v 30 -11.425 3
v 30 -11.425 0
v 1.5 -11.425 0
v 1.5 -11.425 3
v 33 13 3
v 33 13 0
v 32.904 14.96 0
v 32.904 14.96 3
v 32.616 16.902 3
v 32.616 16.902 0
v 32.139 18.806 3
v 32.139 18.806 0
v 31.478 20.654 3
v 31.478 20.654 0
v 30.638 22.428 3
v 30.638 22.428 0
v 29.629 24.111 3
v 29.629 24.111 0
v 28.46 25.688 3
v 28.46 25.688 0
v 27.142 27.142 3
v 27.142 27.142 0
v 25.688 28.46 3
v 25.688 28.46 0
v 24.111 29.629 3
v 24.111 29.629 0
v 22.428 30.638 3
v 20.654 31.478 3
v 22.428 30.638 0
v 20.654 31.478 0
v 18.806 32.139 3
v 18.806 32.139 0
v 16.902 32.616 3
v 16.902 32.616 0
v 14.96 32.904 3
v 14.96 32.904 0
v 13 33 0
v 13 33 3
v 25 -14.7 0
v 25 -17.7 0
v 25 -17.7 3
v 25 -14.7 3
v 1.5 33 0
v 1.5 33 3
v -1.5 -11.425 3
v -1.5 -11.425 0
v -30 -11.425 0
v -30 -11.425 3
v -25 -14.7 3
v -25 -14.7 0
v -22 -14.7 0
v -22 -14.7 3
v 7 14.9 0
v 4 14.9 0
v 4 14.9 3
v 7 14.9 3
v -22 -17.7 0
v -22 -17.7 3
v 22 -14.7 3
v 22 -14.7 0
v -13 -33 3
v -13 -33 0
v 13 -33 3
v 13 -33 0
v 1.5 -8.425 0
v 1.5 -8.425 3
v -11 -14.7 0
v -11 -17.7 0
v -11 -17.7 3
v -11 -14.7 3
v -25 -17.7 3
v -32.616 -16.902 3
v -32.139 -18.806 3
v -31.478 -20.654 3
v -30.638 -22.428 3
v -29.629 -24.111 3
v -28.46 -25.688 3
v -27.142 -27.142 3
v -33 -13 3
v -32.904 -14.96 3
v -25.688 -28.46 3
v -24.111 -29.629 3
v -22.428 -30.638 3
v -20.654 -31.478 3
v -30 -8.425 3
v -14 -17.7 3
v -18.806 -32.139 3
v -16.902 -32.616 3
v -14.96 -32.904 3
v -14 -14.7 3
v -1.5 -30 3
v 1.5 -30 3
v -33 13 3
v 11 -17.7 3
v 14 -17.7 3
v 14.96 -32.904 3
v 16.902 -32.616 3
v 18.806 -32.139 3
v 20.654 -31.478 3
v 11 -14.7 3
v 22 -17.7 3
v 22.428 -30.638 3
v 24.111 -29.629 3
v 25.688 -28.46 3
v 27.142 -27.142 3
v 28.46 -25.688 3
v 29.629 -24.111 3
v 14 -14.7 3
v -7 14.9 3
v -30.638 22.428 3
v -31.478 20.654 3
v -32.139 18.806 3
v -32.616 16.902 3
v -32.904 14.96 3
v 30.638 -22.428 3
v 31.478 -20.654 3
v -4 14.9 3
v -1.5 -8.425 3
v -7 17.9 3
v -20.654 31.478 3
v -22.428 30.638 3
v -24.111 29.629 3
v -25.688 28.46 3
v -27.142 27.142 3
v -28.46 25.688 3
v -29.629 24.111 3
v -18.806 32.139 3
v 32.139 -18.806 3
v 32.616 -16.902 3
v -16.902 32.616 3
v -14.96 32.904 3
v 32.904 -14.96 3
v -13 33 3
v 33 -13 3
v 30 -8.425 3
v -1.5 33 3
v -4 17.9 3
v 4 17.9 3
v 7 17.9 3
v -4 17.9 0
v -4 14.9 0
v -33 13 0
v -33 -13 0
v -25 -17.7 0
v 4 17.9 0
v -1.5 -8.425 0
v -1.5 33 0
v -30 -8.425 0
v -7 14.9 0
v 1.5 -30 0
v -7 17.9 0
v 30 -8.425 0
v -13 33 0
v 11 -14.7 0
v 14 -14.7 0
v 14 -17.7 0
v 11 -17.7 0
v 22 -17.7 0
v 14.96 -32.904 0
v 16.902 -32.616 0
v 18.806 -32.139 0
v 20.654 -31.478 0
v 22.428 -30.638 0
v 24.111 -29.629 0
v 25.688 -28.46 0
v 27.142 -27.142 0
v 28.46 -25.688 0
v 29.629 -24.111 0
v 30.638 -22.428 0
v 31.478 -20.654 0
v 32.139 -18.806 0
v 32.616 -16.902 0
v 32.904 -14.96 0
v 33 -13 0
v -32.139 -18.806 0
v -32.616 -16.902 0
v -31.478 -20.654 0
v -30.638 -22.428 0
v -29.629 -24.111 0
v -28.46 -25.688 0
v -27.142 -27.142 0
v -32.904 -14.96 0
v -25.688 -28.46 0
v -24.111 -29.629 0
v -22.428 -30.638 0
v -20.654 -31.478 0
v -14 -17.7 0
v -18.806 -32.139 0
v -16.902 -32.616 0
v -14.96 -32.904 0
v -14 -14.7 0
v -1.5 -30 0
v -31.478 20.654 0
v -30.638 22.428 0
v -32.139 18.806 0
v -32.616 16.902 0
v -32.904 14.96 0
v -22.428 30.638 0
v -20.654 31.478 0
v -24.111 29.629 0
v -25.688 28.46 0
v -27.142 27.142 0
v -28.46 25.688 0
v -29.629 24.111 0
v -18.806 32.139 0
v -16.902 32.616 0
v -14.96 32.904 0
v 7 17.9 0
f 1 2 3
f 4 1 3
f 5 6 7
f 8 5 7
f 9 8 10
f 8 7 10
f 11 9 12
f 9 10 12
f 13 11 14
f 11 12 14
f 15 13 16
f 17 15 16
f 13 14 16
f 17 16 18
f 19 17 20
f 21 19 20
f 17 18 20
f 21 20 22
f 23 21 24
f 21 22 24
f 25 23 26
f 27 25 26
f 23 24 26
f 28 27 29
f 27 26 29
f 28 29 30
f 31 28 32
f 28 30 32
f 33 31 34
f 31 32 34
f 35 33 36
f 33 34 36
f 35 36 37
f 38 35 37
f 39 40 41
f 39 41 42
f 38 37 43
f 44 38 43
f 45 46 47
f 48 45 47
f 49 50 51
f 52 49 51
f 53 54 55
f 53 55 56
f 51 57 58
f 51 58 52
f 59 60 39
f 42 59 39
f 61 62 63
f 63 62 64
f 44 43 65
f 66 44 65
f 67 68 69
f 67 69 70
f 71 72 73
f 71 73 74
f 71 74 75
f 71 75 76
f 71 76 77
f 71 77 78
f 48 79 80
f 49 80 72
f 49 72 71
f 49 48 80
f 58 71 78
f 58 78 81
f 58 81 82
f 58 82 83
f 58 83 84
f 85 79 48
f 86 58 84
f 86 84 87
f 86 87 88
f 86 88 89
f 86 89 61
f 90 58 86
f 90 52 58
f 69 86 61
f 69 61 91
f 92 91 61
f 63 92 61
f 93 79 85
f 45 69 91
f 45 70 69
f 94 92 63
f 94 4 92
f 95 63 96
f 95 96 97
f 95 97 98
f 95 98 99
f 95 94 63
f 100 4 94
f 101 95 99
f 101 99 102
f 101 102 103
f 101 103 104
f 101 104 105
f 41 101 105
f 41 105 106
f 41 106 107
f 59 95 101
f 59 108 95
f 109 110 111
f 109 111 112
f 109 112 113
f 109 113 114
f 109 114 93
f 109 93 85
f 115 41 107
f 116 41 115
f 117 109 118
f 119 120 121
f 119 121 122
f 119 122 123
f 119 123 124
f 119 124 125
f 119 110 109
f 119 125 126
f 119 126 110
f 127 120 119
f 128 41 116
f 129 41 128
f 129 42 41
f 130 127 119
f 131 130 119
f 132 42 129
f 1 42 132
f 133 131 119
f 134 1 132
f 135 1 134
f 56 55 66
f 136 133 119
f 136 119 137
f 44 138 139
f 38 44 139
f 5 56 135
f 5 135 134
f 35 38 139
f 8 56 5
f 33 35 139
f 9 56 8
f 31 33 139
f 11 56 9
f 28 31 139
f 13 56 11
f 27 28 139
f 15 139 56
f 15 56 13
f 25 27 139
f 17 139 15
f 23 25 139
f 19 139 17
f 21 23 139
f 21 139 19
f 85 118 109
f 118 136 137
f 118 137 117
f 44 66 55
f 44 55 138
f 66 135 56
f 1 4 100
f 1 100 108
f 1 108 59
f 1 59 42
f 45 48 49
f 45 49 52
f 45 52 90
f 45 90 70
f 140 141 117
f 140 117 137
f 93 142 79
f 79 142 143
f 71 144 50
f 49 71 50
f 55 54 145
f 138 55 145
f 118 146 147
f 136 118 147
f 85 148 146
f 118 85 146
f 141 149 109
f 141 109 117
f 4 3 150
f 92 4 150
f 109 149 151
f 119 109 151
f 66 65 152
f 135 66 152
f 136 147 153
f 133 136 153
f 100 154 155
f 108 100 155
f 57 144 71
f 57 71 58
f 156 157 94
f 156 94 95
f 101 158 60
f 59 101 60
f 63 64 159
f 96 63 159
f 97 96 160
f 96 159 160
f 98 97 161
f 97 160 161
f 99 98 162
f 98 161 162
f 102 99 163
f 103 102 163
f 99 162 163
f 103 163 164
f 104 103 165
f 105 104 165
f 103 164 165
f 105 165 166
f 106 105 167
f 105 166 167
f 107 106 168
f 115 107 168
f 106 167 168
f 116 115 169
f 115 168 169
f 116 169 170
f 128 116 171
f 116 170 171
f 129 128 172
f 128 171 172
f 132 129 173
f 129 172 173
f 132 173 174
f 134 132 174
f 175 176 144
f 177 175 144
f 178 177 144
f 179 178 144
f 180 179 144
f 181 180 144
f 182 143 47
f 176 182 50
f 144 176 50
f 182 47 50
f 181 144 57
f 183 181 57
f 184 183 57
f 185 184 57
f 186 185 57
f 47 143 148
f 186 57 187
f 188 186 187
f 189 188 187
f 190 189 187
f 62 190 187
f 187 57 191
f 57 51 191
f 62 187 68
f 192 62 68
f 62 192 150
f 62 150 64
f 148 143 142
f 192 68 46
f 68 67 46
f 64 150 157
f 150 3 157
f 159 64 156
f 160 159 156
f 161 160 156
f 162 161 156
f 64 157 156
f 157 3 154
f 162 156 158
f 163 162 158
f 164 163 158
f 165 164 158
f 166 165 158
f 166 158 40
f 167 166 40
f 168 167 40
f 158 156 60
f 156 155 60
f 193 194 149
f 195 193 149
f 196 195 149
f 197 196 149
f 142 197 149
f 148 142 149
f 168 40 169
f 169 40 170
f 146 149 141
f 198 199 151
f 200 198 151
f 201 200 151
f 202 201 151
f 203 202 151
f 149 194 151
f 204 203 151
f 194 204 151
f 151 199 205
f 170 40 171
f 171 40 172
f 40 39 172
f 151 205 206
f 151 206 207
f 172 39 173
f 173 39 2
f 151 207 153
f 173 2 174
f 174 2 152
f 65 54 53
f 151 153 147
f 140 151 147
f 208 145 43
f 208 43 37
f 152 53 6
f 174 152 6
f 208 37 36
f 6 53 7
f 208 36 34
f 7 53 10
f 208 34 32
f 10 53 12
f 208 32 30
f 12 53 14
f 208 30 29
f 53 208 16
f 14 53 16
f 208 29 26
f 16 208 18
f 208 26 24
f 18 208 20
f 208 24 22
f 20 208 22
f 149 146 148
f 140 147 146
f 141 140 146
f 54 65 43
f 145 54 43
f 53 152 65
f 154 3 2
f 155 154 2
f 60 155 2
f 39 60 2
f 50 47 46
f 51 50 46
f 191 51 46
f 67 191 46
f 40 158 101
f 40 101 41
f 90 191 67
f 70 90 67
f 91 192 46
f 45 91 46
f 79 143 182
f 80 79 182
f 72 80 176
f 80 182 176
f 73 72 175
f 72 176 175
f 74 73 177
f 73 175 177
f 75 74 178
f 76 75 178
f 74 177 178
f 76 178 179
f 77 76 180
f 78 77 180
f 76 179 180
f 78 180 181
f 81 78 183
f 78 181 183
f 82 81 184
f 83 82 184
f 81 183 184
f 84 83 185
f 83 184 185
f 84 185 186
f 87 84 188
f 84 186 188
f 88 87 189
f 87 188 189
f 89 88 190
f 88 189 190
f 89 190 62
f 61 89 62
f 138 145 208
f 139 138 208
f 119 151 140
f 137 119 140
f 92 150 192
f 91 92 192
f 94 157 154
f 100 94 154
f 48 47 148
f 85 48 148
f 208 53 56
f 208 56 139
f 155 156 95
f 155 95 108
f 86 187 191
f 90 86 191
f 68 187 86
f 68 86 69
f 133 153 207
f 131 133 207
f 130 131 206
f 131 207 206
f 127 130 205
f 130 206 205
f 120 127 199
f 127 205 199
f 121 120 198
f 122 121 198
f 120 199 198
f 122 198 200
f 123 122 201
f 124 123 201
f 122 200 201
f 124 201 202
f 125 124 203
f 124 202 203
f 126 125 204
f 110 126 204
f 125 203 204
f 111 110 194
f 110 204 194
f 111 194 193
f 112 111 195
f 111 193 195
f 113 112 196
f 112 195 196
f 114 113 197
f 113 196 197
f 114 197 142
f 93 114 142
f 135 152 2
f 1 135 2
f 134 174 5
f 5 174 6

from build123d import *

# Parameters (mm, degrees)
CROQUIS1_W              = 3
CROQUIS1_H              = 3
SALIENTE_EXTRUIR1_DEPTH = 3


with BuildPart() as part:
    # Croquis1 → Saliente-Extruir1 (new body)
    with BuildSketch(Plane.XY):
        with BuildLine():
            Line((-30, -11.425), (-30, -8.425))
            Line((-30, -8.425), (-1.5, -8.425))
            Line((-1.5, -8.425), (-1.5, 30))
            Line((-1.5, 30), (-1.5, 33))
            Line((-1.5, 33), (-13, 33))
            ThreePointArc((-13, 33), (-27.142135624, 27.142135624), (-33, 13))
            Line((-33, 13), (-33, -13))
            ThreePointArc((-33, -13), (-27.142135624, -27.142135624), (-13, -33))
            Line((-13, -33), (13, -33))
            ThreePointArc((13, -33), (27.142135624, -27.142135624), (33, -13))
            Line((33, -13), (33, 13))
            ThreePointArc((33, 13), (27.142135624, 27.142135624), (13, 33))
            Line((13, 33), (1.5, 33))
            Line((1.5, 33), (1.5, 30))
            Line((1.5, 30), (1.5, -8.425))
            Line((1.5, -8.425), (30, -8.425))
            Line((30, -8.425), (30, -11.425))
            Line((30, -11.425), (1.5, -11.425))
            Line((1.5, -11.425), (1.5, -30))
            Line((1.5, -30), (-1.5, -30))
            Line((-1.5, -30), (-1.5, -11.425))
            Line((-1.5, -11.425), (-30, -11.425))
        make_face()
        with Locations((-23.5, -16.2)):
            Rectangle(CROQUIS1_W, CROQUIS1_H, mode=Mode.SUBTRACT)
        with Locations((-12.5, -16.2)):
            Rectangle(CROQUIS1_W, CROQUIS1_H, mode=Mode.SUBTRACT)
        with Locations((12.5, -16.2)):
            Rectangle(CROQUIS1_W, CROQUIS1_H, mode=Mode.SUBTRACT)
        with Locations((23.5, -16.2)):
            Rectangle(CROQUIS1_W, CROQUIS1_H, mode=Mode.SUBTRACT)
        with Locations((-5.5, 16.4)):
            Rectangle(CROQUIS1_W, CROQUIS1_H, mode=Mode.SUBTRACT)
        with Locations((5.5, 16.4)):
            Rectangle(CROQUIS1_W, CROQUIS1_H, mode=Mode.SUBTRACT)
    extrude(amount=SALIENTE_EXTRUIR1_DEPTH)


solid = part.part
